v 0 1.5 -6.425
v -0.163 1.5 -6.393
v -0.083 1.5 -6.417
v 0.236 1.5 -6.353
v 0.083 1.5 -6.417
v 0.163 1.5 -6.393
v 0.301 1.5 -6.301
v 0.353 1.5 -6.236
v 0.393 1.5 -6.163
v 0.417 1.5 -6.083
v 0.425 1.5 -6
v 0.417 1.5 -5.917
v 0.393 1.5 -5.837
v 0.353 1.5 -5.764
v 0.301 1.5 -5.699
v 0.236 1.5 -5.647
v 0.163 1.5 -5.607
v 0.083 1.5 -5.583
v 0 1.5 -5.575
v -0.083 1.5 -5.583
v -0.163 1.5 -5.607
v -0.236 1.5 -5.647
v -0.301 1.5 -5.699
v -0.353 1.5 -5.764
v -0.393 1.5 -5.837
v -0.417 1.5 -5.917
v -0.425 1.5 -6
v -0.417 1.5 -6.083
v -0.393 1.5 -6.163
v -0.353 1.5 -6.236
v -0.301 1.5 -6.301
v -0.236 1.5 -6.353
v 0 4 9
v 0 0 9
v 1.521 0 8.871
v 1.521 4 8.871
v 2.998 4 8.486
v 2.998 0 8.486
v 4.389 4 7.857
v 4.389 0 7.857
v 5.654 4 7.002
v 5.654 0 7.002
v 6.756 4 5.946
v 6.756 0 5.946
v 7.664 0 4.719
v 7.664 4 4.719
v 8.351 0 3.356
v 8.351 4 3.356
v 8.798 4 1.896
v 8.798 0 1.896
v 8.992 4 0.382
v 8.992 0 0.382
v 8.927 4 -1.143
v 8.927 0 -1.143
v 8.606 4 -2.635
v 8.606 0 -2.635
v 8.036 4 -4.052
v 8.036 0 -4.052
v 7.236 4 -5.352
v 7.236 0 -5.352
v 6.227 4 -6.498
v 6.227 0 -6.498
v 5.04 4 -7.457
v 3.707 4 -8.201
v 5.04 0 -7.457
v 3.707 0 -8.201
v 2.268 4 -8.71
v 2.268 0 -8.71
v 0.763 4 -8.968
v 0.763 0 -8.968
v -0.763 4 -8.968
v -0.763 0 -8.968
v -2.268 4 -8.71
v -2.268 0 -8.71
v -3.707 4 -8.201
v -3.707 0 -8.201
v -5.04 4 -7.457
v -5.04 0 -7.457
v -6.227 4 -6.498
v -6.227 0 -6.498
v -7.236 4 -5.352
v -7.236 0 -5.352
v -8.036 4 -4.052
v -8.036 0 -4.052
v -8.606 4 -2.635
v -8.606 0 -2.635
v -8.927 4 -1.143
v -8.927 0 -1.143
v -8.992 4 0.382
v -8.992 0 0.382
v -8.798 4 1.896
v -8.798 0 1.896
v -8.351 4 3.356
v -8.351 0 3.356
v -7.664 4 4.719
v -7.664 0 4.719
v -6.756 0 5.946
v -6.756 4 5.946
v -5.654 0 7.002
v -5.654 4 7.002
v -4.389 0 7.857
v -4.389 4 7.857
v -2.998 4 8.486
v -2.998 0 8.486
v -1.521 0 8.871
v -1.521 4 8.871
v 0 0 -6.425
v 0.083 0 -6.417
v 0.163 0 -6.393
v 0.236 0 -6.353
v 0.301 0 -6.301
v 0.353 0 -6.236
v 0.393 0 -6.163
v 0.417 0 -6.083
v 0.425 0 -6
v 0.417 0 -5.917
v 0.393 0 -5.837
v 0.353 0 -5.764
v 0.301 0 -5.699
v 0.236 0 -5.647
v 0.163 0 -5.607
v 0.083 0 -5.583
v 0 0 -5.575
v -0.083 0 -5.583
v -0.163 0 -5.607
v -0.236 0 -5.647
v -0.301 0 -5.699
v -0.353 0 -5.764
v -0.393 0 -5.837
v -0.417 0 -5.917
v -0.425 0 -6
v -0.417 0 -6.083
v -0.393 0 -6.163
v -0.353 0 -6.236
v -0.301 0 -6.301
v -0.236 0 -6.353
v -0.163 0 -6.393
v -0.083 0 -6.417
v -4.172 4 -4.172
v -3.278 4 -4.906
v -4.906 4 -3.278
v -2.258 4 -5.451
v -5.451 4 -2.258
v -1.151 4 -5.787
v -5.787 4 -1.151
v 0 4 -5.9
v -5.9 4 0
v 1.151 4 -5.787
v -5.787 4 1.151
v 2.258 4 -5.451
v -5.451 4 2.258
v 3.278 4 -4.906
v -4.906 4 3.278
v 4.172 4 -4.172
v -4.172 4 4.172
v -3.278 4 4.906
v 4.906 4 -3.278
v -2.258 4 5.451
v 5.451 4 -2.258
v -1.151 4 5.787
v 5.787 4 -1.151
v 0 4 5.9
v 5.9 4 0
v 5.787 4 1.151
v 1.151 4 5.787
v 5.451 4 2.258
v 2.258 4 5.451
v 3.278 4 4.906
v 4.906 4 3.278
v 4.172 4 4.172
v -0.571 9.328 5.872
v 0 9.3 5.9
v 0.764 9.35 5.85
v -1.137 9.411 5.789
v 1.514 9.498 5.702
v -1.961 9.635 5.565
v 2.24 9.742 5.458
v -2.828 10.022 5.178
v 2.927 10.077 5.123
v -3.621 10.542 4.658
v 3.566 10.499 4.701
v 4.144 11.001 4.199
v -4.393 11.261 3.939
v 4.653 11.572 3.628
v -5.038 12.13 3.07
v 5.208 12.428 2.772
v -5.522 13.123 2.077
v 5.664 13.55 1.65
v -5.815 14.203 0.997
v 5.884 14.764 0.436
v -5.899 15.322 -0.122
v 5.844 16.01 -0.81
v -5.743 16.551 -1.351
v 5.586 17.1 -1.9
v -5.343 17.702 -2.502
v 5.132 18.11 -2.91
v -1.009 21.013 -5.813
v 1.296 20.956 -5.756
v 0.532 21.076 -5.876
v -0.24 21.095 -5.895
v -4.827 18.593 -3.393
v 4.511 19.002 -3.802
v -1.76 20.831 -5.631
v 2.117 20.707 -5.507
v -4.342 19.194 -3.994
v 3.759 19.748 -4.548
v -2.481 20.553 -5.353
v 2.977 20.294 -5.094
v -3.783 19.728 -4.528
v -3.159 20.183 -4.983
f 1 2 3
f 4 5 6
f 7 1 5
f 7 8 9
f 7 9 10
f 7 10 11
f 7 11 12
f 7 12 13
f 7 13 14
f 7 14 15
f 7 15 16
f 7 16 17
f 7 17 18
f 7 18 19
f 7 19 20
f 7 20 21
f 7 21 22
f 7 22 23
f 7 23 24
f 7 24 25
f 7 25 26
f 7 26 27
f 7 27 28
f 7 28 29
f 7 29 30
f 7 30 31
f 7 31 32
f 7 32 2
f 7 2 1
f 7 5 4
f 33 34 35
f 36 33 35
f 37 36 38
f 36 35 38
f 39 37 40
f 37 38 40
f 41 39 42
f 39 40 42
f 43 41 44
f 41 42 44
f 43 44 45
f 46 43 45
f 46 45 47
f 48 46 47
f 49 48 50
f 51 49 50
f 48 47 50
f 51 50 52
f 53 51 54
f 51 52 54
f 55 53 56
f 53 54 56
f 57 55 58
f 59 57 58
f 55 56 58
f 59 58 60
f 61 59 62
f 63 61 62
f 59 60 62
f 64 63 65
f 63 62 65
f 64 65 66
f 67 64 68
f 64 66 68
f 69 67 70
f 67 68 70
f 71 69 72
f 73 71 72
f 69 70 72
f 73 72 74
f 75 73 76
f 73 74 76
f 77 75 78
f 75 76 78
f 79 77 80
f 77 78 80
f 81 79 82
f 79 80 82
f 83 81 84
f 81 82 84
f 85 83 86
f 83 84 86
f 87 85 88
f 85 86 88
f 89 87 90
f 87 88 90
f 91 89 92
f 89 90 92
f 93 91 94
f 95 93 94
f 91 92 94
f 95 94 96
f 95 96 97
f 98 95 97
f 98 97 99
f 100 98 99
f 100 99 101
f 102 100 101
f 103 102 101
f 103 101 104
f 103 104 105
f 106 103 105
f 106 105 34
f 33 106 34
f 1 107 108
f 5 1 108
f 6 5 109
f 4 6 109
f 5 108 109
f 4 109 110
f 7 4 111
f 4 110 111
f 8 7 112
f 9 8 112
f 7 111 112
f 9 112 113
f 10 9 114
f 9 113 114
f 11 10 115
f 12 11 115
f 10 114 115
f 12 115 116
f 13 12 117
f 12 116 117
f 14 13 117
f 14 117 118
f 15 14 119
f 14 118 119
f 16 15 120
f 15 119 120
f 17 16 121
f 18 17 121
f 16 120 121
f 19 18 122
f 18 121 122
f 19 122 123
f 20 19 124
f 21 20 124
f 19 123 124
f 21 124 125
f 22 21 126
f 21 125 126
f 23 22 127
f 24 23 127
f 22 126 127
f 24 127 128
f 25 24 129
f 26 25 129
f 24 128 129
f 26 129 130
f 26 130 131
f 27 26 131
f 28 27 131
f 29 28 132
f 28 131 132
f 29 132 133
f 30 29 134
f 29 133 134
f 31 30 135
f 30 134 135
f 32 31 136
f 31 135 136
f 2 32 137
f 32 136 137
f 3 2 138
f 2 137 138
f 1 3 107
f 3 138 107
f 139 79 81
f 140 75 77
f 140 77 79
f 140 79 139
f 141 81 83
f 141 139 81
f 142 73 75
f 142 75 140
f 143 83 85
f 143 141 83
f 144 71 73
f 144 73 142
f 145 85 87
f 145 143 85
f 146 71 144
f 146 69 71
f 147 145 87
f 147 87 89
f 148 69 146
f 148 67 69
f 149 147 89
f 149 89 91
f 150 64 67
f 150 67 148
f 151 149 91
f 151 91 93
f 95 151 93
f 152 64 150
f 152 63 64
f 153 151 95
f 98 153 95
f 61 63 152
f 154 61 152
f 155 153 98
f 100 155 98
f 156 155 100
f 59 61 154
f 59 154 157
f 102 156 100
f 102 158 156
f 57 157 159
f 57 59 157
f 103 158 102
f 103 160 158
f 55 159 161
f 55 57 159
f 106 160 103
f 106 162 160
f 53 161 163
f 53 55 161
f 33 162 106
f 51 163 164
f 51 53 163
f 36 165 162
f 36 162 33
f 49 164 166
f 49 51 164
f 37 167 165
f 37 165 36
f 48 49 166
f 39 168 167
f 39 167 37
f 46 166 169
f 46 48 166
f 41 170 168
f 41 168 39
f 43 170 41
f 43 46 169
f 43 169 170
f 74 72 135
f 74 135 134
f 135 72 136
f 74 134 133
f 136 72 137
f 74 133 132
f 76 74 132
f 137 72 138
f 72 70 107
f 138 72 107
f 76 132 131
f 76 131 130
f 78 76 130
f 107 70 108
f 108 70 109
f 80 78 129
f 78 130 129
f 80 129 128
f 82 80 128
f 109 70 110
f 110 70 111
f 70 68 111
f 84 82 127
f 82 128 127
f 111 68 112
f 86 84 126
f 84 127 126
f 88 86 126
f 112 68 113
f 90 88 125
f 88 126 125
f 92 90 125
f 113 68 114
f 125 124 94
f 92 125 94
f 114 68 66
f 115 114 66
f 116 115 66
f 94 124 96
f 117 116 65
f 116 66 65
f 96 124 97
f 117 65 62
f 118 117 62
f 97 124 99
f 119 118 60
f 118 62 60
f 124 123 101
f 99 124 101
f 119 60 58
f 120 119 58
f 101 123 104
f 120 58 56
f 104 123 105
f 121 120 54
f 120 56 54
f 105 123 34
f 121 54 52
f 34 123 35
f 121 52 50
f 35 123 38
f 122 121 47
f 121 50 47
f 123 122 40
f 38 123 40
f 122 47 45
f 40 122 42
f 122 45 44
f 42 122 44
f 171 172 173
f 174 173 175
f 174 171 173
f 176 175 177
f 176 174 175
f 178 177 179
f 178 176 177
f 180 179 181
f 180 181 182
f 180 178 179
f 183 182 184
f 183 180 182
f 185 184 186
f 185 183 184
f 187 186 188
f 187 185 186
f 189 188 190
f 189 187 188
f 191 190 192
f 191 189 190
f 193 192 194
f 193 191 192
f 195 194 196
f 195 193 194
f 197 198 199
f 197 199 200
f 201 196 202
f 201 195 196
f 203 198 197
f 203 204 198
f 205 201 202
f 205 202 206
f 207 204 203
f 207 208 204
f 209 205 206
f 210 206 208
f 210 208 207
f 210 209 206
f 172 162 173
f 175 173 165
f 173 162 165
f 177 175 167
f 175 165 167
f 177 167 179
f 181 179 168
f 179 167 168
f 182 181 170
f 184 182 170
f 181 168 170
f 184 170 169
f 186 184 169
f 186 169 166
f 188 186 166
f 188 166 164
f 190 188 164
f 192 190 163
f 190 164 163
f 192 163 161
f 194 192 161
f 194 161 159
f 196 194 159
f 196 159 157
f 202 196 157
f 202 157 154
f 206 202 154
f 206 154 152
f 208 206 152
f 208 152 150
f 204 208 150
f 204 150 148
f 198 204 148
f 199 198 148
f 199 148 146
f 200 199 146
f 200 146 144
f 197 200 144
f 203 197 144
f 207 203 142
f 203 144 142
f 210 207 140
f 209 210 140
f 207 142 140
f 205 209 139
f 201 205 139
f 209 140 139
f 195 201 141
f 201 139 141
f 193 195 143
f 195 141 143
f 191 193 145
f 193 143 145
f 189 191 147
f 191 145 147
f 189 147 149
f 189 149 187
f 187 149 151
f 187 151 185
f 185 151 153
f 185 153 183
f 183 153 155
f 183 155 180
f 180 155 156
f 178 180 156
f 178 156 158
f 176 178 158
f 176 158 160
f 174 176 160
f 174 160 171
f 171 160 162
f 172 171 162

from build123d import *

# Parameters (mm, degrees)
SKETCH1_R               = 9
BOSS_EXTRUDE1_DEPTH     = 4
SKETCH2_R               = 5.9
BOSS_EXTRUDE2_DEPTH     = 20
CUT_EXTRUDE1_DEPTH      = 28.166155414
CUT_EXTRUDE1_DEPTH_BACK = 28.166155414
SKETCH4_R               = 0.425
CUT_EXTRUDE2_DEPTH      = 1.5


with BuildPart() as part:
    # Sketch1 → Boss-Extrude1 (new body)
    with BuildSketch(Plane(origin=(0, 0, 0), x_dir=(1, 0, 0), z_dir=(0, 1, 0))):
        with Locations(Location((0, 0, 0), (0, 0, 270))):
            Circle(SKETCH1_R)
    extrude(amount=BOSS_EXTRUDE1_DEPTH)

    # Sketch2 → Boss-Extrude2 (add)
    with BuildSketch(Plane(origin=(0, 4, 0), x_dir=(1, 0, 0), z_dir=(0, 1, 0))):
        with Locations(Location((0, 0, 0), (0, 0, 270))):
            Circle(SKETCH2_R)
    extrude(amount=BOSS_EXTRUDE2_DEPTH)

    # Sketch3 → Cut-Extrude1 (cut, two sides: drawn at the far end of the back side and taken through both)
    with BuildSketch(Plane(origin=(0, 0, 0), x_dir=(0, 0, -1), z_dir=(1, 0, 0)).offset(-CUT_EXTRUDE1_DEPTH_BACK)):
        Polygon((-6.28, 8.92), (6.28, 21.48), (6.28, 28.771900514), (-6.28, 28.771900514), align=None)
    extrude(amount=CUT_EXTRUDE1_DEPTH + CUT_EXTRUDE1_DEPTH_BACK, mode=Mode.SUBTRACT)

    # Sketch4 → Cut-Extrude2 (cut)
    with BuildSketch(Plane.XZ):
        with Locations(Location((0, -6, 0), (0, 0, 270))):
            Circle(SKETCH4_R)
    extrude(amount=-CUT_EXTRUDE2_DEPTH, mode=Mode.SUBTRACT)


solid = part.part
